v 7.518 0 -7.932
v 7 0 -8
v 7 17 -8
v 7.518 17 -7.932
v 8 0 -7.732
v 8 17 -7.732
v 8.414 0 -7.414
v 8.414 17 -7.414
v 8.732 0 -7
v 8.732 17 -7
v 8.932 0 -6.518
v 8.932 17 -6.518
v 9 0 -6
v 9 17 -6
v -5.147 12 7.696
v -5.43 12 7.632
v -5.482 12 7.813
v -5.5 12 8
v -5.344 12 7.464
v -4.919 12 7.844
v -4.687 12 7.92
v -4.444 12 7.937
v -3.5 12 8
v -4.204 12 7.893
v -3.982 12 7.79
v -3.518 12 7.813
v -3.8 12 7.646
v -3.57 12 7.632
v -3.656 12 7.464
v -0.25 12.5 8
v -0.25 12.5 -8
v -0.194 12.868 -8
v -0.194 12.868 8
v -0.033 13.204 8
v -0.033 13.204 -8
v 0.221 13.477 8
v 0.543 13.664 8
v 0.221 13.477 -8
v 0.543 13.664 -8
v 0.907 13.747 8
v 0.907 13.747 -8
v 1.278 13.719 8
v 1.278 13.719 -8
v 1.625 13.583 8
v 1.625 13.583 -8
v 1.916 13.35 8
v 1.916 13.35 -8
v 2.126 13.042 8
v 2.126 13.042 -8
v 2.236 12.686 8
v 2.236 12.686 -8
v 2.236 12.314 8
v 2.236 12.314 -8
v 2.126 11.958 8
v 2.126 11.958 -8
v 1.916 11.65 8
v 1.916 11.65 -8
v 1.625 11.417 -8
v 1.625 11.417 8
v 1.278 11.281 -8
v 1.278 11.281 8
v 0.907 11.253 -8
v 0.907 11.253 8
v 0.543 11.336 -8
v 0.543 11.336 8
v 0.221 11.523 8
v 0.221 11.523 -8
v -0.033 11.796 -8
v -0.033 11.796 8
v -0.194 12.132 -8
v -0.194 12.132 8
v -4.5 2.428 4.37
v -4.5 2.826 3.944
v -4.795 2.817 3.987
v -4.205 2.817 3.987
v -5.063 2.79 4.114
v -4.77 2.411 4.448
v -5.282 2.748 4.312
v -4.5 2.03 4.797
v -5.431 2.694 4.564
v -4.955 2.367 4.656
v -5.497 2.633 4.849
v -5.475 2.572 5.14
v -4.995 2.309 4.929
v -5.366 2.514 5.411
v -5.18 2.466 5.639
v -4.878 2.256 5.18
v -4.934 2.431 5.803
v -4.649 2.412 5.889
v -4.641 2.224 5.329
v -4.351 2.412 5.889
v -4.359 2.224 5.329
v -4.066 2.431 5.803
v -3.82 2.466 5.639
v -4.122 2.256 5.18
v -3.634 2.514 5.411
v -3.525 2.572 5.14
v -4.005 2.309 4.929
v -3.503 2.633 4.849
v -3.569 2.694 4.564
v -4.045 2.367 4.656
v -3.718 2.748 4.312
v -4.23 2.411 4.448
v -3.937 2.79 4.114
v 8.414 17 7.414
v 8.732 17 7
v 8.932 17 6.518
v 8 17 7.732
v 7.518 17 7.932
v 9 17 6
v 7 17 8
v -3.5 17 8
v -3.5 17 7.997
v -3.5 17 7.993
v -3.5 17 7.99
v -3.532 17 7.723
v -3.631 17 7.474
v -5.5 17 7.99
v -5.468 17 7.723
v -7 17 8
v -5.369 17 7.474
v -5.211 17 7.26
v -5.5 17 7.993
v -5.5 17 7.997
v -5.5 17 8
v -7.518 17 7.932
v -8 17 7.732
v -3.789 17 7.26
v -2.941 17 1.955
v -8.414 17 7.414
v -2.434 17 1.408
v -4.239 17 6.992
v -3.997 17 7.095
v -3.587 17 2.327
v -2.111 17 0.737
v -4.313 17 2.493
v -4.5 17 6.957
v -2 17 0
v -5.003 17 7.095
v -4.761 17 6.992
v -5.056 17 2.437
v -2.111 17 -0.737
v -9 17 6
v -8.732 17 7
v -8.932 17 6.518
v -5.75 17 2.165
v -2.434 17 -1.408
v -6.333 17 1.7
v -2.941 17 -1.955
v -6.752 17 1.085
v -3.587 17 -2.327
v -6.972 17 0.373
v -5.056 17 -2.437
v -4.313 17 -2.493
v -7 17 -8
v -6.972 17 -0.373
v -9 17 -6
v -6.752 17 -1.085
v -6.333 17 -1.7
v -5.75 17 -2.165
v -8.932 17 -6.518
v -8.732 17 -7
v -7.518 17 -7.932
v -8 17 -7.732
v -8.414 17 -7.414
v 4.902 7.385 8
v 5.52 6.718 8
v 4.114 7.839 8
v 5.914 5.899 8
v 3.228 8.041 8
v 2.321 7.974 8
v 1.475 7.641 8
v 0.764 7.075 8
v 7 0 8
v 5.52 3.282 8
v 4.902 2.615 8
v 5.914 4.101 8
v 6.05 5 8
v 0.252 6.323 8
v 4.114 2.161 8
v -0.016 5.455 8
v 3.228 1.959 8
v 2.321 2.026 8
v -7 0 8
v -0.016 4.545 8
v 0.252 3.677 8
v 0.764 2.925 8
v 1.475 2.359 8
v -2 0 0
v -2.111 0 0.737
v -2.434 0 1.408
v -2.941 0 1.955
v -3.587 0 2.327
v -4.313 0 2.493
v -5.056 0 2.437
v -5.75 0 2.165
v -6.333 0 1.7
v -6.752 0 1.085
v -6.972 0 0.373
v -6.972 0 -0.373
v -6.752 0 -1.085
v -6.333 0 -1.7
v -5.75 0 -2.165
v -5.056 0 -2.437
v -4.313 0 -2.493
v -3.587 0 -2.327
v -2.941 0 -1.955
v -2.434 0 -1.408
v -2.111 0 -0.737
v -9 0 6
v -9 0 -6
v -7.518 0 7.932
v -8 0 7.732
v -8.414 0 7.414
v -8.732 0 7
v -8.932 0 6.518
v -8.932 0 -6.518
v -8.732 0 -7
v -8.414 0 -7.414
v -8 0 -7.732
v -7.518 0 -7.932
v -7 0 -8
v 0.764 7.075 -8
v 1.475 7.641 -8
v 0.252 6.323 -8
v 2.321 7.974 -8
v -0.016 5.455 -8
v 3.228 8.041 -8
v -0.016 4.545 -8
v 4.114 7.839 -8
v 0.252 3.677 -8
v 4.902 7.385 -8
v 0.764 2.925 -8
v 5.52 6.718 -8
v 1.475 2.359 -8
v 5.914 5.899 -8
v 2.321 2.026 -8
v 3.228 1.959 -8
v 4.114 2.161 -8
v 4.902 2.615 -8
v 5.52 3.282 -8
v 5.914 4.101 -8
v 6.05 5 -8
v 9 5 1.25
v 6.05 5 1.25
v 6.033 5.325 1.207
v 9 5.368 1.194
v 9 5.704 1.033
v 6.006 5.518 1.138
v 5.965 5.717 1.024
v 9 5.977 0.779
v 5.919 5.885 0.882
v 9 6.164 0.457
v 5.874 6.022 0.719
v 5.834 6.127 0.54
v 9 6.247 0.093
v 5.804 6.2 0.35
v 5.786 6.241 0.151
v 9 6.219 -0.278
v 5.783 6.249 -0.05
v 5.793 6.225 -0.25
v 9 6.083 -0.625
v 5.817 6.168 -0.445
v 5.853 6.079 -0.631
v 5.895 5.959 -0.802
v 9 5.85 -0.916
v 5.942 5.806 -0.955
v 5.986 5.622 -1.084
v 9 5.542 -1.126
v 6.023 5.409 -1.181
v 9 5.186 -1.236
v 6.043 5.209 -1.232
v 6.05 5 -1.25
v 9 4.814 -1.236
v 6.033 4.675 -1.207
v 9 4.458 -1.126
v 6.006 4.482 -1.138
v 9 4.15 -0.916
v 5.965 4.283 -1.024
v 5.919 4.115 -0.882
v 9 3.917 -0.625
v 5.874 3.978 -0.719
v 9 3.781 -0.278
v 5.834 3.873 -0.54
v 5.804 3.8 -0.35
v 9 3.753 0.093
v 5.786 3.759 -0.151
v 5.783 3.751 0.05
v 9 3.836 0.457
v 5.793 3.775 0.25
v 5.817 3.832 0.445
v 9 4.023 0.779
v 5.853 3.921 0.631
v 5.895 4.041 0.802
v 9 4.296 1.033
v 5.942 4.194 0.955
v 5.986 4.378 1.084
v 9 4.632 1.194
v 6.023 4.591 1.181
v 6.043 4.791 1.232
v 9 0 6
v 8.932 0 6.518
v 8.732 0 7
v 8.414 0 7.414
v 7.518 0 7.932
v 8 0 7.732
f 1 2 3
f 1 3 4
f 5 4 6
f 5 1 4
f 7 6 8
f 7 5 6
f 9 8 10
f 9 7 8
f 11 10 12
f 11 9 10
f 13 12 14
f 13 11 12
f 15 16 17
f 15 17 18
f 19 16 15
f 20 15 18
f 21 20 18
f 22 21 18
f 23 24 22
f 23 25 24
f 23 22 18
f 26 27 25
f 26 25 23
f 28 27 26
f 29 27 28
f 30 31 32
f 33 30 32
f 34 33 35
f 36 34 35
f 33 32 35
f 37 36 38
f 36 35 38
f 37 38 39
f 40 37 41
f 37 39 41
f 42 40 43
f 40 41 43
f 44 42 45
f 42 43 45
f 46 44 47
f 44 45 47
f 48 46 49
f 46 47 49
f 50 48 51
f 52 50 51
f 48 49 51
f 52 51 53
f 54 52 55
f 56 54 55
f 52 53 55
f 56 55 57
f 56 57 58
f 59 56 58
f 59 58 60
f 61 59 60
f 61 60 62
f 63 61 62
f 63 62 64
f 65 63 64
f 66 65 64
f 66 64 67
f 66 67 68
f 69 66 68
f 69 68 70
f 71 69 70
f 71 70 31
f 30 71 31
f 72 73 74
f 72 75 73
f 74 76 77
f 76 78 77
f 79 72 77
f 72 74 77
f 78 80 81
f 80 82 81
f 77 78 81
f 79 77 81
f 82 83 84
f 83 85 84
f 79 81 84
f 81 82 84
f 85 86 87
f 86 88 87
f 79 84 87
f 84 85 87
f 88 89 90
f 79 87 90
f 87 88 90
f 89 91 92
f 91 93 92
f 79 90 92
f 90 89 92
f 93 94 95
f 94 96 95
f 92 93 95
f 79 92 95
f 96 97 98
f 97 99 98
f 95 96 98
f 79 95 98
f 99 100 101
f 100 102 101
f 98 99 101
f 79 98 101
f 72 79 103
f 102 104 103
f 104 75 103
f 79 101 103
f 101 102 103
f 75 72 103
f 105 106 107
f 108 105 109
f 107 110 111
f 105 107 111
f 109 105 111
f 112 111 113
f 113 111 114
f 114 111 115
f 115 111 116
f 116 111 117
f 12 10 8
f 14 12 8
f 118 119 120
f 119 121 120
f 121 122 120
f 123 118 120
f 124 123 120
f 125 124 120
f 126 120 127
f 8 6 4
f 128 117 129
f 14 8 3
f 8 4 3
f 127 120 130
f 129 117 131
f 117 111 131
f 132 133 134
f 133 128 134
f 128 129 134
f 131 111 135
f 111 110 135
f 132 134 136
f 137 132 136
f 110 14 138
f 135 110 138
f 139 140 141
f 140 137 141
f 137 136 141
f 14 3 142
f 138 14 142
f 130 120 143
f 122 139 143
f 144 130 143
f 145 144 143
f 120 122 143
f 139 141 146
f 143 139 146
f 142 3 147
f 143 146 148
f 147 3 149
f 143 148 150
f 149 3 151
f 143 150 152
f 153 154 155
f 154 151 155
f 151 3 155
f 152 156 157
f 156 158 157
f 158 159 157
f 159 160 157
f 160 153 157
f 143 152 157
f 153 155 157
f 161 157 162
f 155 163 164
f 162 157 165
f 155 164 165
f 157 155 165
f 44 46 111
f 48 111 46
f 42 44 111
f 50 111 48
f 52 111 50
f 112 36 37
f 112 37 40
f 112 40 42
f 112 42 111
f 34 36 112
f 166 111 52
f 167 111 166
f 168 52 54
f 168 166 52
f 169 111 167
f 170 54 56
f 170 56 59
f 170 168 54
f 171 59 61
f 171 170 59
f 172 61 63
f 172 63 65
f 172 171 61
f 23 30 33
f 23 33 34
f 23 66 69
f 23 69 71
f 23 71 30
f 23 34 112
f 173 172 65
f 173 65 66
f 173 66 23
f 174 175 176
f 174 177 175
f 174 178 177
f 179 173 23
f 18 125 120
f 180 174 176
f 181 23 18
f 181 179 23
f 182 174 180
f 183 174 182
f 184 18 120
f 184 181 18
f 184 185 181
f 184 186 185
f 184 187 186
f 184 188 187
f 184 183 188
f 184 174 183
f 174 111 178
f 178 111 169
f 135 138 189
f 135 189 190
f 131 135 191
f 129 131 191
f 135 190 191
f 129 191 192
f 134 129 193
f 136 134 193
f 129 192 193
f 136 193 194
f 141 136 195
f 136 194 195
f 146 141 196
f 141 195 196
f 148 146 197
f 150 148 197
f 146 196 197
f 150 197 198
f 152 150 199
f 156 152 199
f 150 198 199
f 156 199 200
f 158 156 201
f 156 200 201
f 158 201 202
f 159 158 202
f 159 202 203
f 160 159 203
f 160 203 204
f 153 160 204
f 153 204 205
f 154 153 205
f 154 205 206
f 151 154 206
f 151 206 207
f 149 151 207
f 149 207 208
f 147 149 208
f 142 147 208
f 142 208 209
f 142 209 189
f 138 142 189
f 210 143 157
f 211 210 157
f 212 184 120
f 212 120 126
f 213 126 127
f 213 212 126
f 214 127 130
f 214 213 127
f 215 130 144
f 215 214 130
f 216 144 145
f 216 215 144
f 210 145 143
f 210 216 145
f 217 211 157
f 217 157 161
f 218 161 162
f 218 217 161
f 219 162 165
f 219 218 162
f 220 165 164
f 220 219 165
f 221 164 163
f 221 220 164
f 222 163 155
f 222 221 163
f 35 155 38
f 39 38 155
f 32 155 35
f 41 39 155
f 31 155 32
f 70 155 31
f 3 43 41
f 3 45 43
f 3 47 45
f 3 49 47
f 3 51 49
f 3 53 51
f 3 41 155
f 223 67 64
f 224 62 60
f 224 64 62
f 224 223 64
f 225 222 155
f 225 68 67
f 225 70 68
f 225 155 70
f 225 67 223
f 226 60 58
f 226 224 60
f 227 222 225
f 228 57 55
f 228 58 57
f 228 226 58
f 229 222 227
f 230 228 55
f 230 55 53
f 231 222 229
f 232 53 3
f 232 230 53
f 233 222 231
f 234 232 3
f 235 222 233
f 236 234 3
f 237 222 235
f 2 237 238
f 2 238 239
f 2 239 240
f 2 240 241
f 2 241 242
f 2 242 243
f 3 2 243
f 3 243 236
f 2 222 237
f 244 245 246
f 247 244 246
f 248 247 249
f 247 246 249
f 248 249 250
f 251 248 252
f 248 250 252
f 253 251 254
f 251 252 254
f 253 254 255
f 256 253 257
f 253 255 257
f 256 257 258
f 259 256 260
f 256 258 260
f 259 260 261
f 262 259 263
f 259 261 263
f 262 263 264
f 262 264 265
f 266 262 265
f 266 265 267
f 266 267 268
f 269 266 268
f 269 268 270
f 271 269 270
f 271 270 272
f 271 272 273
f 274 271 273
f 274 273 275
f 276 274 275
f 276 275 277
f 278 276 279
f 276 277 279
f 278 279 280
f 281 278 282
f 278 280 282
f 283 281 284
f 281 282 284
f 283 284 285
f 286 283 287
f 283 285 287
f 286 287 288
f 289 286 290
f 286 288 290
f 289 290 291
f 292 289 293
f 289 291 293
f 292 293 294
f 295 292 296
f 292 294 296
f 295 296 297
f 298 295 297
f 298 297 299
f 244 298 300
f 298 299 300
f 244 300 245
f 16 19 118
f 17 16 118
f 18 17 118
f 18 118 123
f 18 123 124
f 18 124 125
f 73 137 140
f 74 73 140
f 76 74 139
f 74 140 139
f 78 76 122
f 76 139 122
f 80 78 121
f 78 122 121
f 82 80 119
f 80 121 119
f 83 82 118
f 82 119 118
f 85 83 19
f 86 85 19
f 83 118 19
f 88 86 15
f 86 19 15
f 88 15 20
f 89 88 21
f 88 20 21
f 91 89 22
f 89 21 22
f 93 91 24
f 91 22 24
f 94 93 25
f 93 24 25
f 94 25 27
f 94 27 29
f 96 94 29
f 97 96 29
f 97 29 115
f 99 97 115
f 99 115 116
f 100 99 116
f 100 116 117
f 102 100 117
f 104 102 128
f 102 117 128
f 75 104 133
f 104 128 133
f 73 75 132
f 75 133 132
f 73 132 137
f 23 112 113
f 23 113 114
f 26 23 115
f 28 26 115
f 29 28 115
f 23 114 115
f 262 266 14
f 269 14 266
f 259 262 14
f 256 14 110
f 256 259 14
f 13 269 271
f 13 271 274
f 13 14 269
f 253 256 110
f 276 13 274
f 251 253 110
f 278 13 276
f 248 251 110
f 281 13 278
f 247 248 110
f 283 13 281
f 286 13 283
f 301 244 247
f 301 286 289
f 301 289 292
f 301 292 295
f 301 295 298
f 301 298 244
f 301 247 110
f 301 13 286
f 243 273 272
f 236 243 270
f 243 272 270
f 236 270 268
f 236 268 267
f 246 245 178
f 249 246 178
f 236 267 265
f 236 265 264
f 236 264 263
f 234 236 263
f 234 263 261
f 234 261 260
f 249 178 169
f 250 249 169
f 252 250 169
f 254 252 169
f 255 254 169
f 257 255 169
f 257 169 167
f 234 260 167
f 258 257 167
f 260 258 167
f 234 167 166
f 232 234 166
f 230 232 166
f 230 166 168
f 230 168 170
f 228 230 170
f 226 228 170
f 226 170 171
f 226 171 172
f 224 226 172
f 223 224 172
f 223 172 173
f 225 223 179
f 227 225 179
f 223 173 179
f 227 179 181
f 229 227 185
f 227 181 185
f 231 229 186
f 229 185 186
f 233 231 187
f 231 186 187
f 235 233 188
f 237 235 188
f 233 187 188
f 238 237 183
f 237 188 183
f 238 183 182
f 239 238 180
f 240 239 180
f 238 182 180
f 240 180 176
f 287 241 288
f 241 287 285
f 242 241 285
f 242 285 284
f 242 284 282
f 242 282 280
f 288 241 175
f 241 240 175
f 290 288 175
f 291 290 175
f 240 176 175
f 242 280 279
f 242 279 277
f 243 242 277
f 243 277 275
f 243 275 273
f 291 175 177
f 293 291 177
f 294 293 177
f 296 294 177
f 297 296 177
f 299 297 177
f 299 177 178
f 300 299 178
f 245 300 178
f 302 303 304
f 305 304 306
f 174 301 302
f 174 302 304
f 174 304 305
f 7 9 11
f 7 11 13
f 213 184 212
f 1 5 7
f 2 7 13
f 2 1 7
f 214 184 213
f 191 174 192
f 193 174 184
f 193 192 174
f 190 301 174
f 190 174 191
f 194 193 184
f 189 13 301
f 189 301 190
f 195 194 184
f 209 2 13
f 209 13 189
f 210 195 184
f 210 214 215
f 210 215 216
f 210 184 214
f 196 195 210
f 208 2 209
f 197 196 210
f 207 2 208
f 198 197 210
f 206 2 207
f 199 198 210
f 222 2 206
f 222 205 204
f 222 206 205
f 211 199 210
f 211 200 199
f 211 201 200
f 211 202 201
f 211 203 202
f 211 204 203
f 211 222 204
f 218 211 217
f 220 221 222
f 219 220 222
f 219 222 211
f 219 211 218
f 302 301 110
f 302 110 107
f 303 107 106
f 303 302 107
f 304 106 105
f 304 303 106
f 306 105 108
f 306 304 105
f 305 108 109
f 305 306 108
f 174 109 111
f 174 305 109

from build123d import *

# Parameters (mm, degrees)
BOSS_EXTRUDE1_DEPTH       = 17
SKETCH2_R                 = 3.05
CUT_EXTRUDE1_DEPTH        = 17
M3X0_5_TAPPED_HOLE1_D     = 2.5
M6X1_0_TAPPED_HOLE1_D     = 5
SKETCH7_R                 = 1
CUT_EXTRUDE2_DEPTH        = 5
M3X0_5_TAPPED_HOLE2_D     = 2.5
M3X0_5_TAPPED_HOLE2_DEPTH = 6
M3X0_5_TAPPED_HOLE2_TIP   = 0.751075774


with BuildPart() as part:
    # Sketch1 → Boss-Extrude1 (new body)
    with BuildSketch(Plane(origin=(0, 0, 0), x_dir=(1, 0, 0), z_dir=(0, 1, 0))):
        with BuildLine():
            Line((-7, 8), (7, 8))
            ThreePointArc((7, 8), (8.414213562, 7.414213562), (9, 6))
            Line((9, 6), (9, -6))
            ThreePointArc((9, -6), (8.414213562, -7.414213562), (7, -8))
            Line((7, -8), (-7, -8))
            ThreePointArc((-7, -8), (-8.414213562, -7.414213562), (-9, -6))
            Line((-9, -6), (-9, 6))
            ThreePointArc((-9, 6), (-8.414213562, 7.414213562), (-7, 8))
        make_face()
    extrude(amount=BOSS_EXTRUDE1_DEPTH)

    # Sketch2 → Cut-Extrude1 (cut, through all)
    with BuildSketch(Plane.XY.offset(8)):
        with Locations((3, 5)):
            Circle(SKETCH2_R)
    extrude(amount=-CUT_EXTRUDE1_DEPTH, mode=Mode.SUBTRACT)

    # M3x0.5 Tapped Hole1 (through all)
    with Locations(Plane.XY.offset(8)):
        with Locations((1, 12.5)):
            Hole(M3X0_5_TAPPED_HOLE1_D / 2)

    # M6x1.0 Tapped Hole1 (through all)
    with Locations(Plane(origin=(0, 17, 0), x_dir=(-1, 0, 0), z_dir=(0, 1, 0))):
        with Locations((4.5, 0)):
            Hole(M6X1_0_TAPPED_HOLE1_D / 2)

    # Sketch7 → Cut-Extrude2 (cut)
    with BuildSketch(Plane(origin=(0, 17, 0), x_dir=(1, 0, 0), z_dir=(0, 1, 0))):
        with Locations((-4.5, -8)):
            Circle(SKETCH7_R)
    extrude(amount=-CUT_EXTRUDE2_DEPTH, mode=Mode.SUBTRACT)

    # Sketch8 → Cut-Revolve1 (revolve, cut)
    with BuildSketch(Plane.ZY.offset(4.5), mode=Mode.PRIVATE) as cut_revolve1_sk:
        Polygon((4.796926452, 2.030181318), (5.9, 2.41), (9.273428811, 18.280734757), (8.29528121, 18.488646447), align=None)
    revolve(cut_revolve1_sk.sketch.rotate(Axis((-4.5, 1.132659385, 4.606152276), (0, 0.978147601, 0.207911691)), 180), axis=Axis((-4.5, 1.132659385, 4.606152276), (0, 0.978147601, 0.207911691)), mode=Mode.SUBTRACT)  # turned: the seam where the file's is

    # M3x0.5 Tapped Hole2
    with Locations(Plane(origin=(9, 0, 0), x_dir=(0, 0, -1), z_dir=(1, 0, 0))):
        with Locations((0, 5)):
            Hole(M3X0_5_TAPPED_HOLE2_D / 2, depth=M3X0_5_TAPPED_HOLE2_DEPTH)
            with Locations((0, 0, -(M3X0_5_TAPPED_HOLE2_DEPTH + M3X0_5_TAPPED_HOLE2_TIP / 2))):  # 118° drill point
                Cone(0, M3X0_5_TAPPED_HOLE2_D / 2, M3X0_5_TAPPED_HOLE2_TIP, mode=Mode.SUBTRACT)


solid = part.part
